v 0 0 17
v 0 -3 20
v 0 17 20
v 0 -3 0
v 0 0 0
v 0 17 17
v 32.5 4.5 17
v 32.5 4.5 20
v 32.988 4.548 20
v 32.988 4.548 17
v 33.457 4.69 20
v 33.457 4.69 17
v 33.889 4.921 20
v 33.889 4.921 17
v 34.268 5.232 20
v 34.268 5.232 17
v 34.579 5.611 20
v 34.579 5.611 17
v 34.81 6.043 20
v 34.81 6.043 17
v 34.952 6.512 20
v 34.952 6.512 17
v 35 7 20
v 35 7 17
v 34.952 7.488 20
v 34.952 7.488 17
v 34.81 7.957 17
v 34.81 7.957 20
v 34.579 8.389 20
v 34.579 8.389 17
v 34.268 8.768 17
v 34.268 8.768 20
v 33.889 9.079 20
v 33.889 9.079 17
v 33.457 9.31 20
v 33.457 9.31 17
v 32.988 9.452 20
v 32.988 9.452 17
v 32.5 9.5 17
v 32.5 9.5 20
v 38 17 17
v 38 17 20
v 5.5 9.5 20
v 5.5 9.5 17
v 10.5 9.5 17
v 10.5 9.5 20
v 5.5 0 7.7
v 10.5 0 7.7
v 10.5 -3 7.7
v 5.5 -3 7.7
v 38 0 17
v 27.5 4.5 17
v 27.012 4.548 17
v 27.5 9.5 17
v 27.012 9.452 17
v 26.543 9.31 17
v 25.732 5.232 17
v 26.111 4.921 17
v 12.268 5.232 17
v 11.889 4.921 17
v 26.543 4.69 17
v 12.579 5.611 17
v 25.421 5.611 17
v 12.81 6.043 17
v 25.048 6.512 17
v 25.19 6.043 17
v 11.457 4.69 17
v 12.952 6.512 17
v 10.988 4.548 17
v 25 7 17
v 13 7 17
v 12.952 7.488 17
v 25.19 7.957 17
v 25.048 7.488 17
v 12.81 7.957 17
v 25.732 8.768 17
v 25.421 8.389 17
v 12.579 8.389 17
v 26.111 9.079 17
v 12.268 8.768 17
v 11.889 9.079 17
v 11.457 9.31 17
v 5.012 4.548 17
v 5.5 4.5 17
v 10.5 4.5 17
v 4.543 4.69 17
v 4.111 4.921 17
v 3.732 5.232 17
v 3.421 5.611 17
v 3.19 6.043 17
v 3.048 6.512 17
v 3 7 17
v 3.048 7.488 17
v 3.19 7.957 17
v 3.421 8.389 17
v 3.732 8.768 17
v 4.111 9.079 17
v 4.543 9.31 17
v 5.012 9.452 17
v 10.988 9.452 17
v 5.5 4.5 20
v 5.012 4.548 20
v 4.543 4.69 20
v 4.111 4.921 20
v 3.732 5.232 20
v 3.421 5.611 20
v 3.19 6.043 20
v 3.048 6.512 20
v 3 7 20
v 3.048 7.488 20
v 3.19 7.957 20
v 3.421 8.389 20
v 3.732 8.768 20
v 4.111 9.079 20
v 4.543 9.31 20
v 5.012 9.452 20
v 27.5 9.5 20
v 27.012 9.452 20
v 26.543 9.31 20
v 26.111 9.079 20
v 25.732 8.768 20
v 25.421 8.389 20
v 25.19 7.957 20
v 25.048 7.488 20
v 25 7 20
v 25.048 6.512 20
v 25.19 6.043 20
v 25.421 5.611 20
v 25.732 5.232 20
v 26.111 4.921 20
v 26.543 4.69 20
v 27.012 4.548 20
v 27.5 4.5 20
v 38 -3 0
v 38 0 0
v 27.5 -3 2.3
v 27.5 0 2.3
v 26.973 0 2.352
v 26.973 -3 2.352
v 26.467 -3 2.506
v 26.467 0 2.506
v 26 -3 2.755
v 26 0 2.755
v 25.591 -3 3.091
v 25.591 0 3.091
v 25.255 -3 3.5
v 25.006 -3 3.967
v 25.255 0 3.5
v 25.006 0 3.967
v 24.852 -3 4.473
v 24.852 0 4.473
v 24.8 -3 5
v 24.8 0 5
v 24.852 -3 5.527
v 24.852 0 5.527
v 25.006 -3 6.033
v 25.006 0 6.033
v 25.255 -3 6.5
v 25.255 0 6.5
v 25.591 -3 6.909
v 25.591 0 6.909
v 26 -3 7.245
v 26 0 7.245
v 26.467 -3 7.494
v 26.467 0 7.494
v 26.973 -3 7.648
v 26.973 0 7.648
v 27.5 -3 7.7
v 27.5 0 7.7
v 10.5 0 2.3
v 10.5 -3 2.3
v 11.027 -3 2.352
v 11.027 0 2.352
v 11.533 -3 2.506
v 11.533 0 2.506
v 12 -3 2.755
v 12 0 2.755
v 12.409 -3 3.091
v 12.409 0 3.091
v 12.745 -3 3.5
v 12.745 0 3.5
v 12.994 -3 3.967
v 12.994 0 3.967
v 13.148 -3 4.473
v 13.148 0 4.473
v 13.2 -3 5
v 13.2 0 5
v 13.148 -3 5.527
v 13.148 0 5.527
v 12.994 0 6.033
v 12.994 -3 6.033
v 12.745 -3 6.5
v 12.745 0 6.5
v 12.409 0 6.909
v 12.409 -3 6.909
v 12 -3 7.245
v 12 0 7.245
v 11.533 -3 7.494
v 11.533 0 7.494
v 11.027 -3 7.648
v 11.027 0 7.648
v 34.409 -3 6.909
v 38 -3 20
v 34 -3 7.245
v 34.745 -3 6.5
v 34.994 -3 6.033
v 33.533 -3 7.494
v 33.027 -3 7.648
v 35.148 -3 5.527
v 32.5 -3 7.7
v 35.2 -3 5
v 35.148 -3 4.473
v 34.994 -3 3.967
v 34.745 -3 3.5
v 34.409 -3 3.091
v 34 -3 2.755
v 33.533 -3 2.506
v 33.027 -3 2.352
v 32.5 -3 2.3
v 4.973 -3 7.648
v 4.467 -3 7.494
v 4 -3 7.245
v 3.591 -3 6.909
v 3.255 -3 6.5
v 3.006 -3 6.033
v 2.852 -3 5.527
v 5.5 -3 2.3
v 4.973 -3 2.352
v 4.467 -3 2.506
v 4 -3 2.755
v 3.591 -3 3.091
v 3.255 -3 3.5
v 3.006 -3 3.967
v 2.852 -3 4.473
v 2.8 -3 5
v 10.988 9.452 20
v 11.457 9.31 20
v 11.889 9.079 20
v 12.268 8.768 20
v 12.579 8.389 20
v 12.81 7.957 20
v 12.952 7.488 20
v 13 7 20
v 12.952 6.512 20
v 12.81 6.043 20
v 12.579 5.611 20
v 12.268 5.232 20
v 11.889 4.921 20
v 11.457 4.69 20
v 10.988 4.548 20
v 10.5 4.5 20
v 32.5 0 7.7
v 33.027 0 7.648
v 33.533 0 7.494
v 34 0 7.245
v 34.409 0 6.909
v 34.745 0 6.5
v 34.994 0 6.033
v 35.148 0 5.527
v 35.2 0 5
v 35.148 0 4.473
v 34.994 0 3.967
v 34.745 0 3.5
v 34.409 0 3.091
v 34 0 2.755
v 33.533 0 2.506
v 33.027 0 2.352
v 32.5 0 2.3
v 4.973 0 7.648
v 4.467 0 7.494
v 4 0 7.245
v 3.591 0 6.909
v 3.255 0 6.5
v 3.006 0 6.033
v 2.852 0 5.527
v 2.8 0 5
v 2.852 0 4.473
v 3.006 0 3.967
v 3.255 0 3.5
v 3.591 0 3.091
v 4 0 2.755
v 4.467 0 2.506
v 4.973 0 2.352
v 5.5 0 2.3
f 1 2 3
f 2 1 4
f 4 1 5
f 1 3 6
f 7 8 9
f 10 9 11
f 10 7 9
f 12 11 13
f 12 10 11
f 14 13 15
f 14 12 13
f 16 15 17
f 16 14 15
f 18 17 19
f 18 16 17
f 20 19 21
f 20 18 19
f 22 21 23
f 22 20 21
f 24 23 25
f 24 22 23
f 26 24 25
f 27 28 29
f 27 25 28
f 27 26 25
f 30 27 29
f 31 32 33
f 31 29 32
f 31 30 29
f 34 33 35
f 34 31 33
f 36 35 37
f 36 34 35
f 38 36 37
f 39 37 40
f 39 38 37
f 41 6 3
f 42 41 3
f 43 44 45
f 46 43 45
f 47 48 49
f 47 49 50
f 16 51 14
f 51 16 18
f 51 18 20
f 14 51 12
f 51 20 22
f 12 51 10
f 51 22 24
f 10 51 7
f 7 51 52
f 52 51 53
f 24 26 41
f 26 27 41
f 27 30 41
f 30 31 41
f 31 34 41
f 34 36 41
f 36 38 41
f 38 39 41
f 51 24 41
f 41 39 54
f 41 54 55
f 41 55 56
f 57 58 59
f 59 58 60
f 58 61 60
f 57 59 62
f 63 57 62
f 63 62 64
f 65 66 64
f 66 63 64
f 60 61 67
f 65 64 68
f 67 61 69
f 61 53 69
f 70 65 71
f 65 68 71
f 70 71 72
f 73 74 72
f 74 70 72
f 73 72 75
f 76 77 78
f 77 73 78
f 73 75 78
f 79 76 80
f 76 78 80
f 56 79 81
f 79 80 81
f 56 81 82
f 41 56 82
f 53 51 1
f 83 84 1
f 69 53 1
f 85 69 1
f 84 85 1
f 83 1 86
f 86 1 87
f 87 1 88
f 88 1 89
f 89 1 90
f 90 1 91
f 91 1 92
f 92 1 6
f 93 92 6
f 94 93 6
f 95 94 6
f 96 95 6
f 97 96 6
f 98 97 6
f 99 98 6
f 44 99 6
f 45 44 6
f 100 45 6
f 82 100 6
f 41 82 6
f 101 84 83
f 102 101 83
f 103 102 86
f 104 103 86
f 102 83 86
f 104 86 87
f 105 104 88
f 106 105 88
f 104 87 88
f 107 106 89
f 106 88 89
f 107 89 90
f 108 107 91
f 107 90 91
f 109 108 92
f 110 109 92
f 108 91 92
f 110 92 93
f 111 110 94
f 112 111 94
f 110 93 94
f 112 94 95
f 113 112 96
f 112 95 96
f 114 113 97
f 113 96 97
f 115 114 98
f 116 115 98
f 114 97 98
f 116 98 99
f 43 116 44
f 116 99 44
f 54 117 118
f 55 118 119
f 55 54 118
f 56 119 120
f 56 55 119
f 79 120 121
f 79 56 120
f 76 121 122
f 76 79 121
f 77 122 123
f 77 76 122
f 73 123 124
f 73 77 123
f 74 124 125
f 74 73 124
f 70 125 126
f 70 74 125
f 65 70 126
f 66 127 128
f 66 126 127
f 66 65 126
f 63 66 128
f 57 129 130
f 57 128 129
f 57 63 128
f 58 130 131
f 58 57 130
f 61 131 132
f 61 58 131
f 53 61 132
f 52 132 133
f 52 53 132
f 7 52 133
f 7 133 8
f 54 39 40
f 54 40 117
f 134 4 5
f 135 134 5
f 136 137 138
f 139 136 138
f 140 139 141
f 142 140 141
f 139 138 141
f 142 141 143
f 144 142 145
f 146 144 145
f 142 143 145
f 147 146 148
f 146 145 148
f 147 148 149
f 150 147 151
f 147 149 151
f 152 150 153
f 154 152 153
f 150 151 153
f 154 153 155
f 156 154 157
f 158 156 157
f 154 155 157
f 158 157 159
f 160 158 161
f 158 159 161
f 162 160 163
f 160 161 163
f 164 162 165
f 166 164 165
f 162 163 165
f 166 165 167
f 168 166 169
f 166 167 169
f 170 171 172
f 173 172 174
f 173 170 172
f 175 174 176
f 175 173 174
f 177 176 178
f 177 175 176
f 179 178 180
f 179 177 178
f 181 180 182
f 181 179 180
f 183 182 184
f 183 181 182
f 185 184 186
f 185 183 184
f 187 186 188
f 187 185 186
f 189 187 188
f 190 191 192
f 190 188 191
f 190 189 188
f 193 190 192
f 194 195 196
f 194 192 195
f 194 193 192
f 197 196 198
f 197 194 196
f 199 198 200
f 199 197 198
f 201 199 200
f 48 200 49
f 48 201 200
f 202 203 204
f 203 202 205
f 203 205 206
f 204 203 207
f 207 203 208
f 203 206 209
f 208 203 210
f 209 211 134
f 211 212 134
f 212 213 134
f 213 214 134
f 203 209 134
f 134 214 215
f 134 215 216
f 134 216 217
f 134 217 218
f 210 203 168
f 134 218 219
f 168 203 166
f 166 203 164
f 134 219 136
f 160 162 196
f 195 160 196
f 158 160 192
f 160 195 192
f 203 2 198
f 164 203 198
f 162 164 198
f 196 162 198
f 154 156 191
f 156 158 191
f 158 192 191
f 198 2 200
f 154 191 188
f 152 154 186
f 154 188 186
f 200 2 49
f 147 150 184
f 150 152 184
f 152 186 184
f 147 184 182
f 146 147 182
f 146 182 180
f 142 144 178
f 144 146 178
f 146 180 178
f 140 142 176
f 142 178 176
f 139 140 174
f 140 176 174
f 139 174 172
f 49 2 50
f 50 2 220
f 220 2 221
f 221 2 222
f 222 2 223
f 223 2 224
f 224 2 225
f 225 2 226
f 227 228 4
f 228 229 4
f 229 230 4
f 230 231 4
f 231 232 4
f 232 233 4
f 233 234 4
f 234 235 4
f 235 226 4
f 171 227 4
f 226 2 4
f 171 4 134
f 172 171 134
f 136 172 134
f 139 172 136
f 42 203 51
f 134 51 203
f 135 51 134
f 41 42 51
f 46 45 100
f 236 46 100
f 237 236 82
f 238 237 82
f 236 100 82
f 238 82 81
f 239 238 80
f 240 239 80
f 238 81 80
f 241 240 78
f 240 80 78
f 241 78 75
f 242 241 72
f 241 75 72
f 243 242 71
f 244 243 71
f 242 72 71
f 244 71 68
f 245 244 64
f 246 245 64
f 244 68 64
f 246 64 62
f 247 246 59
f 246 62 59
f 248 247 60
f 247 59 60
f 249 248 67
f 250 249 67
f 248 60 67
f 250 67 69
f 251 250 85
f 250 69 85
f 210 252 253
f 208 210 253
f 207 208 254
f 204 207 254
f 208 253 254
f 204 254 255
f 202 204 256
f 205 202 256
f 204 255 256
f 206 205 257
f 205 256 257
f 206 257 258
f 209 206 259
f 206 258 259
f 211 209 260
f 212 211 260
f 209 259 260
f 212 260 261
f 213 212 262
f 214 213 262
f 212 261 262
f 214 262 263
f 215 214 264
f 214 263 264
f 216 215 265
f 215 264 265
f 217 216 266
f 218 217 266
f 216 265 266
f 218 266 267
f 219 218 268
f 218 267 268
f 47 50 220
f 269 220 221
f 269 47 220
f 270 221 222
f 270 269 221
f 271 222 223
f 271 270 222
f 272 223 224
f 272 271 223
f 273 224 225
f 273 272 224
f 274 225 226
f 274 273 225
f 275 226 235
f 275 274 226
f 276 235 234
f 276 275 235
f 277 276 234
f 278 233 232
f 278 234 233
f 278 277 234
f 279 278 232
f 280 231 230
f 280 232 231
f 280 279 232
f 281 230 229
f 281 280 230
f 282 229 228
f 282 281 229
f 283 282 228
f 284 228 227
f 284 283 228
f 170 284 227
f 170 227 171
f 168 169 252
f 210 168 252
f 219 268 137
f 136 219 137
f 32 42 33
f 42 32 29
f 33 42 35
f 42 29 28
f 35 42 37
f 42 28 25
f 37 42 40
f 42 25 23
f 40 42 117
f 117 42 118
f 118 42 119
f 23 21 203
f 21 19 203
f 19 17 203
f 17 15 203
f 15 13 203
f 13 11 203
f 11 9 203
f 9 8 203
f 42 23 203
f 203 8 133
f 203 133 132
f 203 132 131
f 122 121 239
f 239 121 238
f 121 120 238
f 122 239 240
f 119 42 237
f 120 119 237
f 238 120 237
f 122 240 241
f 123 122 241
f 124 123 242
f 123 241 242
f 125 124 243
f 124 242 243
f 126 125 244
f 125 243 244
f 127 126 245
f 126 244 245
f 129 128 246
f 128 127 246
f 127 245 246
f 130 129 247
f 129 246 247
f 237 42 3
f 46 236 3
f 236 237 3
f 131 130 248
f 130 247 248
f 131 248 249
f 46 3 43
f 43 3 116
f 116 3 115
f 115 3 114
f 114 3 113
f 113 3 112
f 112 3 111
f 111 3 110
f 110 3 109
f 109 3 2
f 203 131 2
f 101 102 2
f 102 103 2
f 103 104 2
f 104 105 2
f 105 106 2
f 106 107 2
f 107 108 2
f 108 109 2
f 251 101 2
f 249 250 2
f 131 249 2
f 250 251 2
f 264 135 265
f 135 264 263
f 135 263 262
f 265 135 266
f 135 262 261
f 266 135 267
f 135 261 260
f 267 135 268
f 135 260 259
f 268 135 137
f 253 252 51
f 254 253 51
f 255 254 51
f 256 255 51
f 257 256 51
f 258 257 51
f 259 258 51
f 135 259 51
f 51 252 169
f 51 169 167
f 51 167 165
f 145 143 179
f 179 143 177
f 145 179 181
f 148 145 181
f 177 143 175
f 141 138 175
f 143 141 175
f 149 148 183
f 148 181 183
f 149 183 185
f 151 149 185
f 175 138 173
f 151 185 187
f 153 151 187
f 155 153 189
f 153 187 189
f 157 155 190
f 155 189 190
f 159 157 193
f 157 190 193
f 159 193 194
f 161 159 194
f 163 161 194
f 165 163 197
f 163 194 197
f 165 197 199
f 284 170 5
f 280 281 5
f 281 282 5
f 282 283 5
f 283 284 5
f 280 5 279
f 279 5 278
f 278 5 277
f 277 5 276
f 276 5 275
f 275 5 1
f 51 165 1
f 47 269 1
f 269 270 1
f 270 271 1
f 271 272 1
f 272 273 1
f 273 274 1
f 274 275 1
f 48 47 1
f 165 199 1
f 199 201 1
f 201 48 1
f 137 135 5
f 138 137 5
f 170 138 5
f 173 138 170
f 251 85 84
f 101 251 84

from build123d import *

# Parameters (mm, degrees)
BOSS_EXTRUDE1_DEPTH = 38
CUT_EXTRUDE1_DEPTH  = 4
CUT_EXTRUDE2_DEPTH  = 4


with BuildPart() as part:
    # Sketch1 → Boss-Extrude1 (new body)
    with BuildSketch(Plane(origin=(0, 0, 0), x_dir=(0, 0, -1), z_dir=(1, 0, 0))):
        Polygon((0, 0), (-17, 0), (-17, 17), (-20, 17), (-20, -3), (0, -3), align=None)
    extrude(amount=BOSS_EXTRUDE1_DEPTH)

    # Sketch2 → Cut-Extrude1 (cut)
    with BuildSketch(Plane(origin=(0, 0, 0), x_dir=(1, 0, 0), z_dir=(0, 1, 0))):
        with BuildLine():
            Line((5.5, -2.3), (10.5, -2.3))
            ThreePointArc((10.5, -2.3), (13.2, -5), (10.5, -7.7))
            Line((10.5, -7.7), (5.5, -7.7))
            ThreePointArc((5.5, -7.7), (2.8, -5), (5.5, -2.3))
        make_face()
        with BuildLine():
            Line((32.5, -2.3), (27.5, -2.3))
            ThreePointArc((27.5, -2.3), (24.8, -5), (27.5, -7.7))
            Line((27.5, -7.7), (32.5, -7.7))
            ThreePointArc((32.5, -7.7), (35.2, -5), (32.5, -2.3))
        make_face()
    extrude(amount=-CUT_EXTRUDE1_DEPTH, mode=Mode.SUBTRACT)

    # Sketch3 → Cut-Extrude2 (cut)
    with BuildSketch(Plane(origin=(0, 0, 17), x_dir=(-1, 0, 0), z_dir=(0, 0, -1))):
        with BuildLine():
            Line((-32.5, 9.5), (-27.5, 9.5))
            ThreePointArc((-27.5, 9.5), (-25, 7), (-27.5, 4.5))
            Line((-27.5, 4.5), (-32.5, 4.5))
            ThreePointArc((-32.5, 4.5), (-35, 7), (-32.5, 9.5))
        make_face()
        with BuildLine():
            Line((-5.5, 9.5), (-10.5, 9.5))
            ThreePointArc((-10.5, 9.5), (-13, 7), (-10.5, 4.5))
            Line((-10.5, 4.5), (-5.5, 4.5))
            ThreePointArc((-5.5, 4.5), (-3, 7), (-5.5, 9.5))
        make_face()
    extrude(amount=-CUT_EXTRUDE2_DEPTH, mode=Mode.SUBTRACT)


solid = part.part
